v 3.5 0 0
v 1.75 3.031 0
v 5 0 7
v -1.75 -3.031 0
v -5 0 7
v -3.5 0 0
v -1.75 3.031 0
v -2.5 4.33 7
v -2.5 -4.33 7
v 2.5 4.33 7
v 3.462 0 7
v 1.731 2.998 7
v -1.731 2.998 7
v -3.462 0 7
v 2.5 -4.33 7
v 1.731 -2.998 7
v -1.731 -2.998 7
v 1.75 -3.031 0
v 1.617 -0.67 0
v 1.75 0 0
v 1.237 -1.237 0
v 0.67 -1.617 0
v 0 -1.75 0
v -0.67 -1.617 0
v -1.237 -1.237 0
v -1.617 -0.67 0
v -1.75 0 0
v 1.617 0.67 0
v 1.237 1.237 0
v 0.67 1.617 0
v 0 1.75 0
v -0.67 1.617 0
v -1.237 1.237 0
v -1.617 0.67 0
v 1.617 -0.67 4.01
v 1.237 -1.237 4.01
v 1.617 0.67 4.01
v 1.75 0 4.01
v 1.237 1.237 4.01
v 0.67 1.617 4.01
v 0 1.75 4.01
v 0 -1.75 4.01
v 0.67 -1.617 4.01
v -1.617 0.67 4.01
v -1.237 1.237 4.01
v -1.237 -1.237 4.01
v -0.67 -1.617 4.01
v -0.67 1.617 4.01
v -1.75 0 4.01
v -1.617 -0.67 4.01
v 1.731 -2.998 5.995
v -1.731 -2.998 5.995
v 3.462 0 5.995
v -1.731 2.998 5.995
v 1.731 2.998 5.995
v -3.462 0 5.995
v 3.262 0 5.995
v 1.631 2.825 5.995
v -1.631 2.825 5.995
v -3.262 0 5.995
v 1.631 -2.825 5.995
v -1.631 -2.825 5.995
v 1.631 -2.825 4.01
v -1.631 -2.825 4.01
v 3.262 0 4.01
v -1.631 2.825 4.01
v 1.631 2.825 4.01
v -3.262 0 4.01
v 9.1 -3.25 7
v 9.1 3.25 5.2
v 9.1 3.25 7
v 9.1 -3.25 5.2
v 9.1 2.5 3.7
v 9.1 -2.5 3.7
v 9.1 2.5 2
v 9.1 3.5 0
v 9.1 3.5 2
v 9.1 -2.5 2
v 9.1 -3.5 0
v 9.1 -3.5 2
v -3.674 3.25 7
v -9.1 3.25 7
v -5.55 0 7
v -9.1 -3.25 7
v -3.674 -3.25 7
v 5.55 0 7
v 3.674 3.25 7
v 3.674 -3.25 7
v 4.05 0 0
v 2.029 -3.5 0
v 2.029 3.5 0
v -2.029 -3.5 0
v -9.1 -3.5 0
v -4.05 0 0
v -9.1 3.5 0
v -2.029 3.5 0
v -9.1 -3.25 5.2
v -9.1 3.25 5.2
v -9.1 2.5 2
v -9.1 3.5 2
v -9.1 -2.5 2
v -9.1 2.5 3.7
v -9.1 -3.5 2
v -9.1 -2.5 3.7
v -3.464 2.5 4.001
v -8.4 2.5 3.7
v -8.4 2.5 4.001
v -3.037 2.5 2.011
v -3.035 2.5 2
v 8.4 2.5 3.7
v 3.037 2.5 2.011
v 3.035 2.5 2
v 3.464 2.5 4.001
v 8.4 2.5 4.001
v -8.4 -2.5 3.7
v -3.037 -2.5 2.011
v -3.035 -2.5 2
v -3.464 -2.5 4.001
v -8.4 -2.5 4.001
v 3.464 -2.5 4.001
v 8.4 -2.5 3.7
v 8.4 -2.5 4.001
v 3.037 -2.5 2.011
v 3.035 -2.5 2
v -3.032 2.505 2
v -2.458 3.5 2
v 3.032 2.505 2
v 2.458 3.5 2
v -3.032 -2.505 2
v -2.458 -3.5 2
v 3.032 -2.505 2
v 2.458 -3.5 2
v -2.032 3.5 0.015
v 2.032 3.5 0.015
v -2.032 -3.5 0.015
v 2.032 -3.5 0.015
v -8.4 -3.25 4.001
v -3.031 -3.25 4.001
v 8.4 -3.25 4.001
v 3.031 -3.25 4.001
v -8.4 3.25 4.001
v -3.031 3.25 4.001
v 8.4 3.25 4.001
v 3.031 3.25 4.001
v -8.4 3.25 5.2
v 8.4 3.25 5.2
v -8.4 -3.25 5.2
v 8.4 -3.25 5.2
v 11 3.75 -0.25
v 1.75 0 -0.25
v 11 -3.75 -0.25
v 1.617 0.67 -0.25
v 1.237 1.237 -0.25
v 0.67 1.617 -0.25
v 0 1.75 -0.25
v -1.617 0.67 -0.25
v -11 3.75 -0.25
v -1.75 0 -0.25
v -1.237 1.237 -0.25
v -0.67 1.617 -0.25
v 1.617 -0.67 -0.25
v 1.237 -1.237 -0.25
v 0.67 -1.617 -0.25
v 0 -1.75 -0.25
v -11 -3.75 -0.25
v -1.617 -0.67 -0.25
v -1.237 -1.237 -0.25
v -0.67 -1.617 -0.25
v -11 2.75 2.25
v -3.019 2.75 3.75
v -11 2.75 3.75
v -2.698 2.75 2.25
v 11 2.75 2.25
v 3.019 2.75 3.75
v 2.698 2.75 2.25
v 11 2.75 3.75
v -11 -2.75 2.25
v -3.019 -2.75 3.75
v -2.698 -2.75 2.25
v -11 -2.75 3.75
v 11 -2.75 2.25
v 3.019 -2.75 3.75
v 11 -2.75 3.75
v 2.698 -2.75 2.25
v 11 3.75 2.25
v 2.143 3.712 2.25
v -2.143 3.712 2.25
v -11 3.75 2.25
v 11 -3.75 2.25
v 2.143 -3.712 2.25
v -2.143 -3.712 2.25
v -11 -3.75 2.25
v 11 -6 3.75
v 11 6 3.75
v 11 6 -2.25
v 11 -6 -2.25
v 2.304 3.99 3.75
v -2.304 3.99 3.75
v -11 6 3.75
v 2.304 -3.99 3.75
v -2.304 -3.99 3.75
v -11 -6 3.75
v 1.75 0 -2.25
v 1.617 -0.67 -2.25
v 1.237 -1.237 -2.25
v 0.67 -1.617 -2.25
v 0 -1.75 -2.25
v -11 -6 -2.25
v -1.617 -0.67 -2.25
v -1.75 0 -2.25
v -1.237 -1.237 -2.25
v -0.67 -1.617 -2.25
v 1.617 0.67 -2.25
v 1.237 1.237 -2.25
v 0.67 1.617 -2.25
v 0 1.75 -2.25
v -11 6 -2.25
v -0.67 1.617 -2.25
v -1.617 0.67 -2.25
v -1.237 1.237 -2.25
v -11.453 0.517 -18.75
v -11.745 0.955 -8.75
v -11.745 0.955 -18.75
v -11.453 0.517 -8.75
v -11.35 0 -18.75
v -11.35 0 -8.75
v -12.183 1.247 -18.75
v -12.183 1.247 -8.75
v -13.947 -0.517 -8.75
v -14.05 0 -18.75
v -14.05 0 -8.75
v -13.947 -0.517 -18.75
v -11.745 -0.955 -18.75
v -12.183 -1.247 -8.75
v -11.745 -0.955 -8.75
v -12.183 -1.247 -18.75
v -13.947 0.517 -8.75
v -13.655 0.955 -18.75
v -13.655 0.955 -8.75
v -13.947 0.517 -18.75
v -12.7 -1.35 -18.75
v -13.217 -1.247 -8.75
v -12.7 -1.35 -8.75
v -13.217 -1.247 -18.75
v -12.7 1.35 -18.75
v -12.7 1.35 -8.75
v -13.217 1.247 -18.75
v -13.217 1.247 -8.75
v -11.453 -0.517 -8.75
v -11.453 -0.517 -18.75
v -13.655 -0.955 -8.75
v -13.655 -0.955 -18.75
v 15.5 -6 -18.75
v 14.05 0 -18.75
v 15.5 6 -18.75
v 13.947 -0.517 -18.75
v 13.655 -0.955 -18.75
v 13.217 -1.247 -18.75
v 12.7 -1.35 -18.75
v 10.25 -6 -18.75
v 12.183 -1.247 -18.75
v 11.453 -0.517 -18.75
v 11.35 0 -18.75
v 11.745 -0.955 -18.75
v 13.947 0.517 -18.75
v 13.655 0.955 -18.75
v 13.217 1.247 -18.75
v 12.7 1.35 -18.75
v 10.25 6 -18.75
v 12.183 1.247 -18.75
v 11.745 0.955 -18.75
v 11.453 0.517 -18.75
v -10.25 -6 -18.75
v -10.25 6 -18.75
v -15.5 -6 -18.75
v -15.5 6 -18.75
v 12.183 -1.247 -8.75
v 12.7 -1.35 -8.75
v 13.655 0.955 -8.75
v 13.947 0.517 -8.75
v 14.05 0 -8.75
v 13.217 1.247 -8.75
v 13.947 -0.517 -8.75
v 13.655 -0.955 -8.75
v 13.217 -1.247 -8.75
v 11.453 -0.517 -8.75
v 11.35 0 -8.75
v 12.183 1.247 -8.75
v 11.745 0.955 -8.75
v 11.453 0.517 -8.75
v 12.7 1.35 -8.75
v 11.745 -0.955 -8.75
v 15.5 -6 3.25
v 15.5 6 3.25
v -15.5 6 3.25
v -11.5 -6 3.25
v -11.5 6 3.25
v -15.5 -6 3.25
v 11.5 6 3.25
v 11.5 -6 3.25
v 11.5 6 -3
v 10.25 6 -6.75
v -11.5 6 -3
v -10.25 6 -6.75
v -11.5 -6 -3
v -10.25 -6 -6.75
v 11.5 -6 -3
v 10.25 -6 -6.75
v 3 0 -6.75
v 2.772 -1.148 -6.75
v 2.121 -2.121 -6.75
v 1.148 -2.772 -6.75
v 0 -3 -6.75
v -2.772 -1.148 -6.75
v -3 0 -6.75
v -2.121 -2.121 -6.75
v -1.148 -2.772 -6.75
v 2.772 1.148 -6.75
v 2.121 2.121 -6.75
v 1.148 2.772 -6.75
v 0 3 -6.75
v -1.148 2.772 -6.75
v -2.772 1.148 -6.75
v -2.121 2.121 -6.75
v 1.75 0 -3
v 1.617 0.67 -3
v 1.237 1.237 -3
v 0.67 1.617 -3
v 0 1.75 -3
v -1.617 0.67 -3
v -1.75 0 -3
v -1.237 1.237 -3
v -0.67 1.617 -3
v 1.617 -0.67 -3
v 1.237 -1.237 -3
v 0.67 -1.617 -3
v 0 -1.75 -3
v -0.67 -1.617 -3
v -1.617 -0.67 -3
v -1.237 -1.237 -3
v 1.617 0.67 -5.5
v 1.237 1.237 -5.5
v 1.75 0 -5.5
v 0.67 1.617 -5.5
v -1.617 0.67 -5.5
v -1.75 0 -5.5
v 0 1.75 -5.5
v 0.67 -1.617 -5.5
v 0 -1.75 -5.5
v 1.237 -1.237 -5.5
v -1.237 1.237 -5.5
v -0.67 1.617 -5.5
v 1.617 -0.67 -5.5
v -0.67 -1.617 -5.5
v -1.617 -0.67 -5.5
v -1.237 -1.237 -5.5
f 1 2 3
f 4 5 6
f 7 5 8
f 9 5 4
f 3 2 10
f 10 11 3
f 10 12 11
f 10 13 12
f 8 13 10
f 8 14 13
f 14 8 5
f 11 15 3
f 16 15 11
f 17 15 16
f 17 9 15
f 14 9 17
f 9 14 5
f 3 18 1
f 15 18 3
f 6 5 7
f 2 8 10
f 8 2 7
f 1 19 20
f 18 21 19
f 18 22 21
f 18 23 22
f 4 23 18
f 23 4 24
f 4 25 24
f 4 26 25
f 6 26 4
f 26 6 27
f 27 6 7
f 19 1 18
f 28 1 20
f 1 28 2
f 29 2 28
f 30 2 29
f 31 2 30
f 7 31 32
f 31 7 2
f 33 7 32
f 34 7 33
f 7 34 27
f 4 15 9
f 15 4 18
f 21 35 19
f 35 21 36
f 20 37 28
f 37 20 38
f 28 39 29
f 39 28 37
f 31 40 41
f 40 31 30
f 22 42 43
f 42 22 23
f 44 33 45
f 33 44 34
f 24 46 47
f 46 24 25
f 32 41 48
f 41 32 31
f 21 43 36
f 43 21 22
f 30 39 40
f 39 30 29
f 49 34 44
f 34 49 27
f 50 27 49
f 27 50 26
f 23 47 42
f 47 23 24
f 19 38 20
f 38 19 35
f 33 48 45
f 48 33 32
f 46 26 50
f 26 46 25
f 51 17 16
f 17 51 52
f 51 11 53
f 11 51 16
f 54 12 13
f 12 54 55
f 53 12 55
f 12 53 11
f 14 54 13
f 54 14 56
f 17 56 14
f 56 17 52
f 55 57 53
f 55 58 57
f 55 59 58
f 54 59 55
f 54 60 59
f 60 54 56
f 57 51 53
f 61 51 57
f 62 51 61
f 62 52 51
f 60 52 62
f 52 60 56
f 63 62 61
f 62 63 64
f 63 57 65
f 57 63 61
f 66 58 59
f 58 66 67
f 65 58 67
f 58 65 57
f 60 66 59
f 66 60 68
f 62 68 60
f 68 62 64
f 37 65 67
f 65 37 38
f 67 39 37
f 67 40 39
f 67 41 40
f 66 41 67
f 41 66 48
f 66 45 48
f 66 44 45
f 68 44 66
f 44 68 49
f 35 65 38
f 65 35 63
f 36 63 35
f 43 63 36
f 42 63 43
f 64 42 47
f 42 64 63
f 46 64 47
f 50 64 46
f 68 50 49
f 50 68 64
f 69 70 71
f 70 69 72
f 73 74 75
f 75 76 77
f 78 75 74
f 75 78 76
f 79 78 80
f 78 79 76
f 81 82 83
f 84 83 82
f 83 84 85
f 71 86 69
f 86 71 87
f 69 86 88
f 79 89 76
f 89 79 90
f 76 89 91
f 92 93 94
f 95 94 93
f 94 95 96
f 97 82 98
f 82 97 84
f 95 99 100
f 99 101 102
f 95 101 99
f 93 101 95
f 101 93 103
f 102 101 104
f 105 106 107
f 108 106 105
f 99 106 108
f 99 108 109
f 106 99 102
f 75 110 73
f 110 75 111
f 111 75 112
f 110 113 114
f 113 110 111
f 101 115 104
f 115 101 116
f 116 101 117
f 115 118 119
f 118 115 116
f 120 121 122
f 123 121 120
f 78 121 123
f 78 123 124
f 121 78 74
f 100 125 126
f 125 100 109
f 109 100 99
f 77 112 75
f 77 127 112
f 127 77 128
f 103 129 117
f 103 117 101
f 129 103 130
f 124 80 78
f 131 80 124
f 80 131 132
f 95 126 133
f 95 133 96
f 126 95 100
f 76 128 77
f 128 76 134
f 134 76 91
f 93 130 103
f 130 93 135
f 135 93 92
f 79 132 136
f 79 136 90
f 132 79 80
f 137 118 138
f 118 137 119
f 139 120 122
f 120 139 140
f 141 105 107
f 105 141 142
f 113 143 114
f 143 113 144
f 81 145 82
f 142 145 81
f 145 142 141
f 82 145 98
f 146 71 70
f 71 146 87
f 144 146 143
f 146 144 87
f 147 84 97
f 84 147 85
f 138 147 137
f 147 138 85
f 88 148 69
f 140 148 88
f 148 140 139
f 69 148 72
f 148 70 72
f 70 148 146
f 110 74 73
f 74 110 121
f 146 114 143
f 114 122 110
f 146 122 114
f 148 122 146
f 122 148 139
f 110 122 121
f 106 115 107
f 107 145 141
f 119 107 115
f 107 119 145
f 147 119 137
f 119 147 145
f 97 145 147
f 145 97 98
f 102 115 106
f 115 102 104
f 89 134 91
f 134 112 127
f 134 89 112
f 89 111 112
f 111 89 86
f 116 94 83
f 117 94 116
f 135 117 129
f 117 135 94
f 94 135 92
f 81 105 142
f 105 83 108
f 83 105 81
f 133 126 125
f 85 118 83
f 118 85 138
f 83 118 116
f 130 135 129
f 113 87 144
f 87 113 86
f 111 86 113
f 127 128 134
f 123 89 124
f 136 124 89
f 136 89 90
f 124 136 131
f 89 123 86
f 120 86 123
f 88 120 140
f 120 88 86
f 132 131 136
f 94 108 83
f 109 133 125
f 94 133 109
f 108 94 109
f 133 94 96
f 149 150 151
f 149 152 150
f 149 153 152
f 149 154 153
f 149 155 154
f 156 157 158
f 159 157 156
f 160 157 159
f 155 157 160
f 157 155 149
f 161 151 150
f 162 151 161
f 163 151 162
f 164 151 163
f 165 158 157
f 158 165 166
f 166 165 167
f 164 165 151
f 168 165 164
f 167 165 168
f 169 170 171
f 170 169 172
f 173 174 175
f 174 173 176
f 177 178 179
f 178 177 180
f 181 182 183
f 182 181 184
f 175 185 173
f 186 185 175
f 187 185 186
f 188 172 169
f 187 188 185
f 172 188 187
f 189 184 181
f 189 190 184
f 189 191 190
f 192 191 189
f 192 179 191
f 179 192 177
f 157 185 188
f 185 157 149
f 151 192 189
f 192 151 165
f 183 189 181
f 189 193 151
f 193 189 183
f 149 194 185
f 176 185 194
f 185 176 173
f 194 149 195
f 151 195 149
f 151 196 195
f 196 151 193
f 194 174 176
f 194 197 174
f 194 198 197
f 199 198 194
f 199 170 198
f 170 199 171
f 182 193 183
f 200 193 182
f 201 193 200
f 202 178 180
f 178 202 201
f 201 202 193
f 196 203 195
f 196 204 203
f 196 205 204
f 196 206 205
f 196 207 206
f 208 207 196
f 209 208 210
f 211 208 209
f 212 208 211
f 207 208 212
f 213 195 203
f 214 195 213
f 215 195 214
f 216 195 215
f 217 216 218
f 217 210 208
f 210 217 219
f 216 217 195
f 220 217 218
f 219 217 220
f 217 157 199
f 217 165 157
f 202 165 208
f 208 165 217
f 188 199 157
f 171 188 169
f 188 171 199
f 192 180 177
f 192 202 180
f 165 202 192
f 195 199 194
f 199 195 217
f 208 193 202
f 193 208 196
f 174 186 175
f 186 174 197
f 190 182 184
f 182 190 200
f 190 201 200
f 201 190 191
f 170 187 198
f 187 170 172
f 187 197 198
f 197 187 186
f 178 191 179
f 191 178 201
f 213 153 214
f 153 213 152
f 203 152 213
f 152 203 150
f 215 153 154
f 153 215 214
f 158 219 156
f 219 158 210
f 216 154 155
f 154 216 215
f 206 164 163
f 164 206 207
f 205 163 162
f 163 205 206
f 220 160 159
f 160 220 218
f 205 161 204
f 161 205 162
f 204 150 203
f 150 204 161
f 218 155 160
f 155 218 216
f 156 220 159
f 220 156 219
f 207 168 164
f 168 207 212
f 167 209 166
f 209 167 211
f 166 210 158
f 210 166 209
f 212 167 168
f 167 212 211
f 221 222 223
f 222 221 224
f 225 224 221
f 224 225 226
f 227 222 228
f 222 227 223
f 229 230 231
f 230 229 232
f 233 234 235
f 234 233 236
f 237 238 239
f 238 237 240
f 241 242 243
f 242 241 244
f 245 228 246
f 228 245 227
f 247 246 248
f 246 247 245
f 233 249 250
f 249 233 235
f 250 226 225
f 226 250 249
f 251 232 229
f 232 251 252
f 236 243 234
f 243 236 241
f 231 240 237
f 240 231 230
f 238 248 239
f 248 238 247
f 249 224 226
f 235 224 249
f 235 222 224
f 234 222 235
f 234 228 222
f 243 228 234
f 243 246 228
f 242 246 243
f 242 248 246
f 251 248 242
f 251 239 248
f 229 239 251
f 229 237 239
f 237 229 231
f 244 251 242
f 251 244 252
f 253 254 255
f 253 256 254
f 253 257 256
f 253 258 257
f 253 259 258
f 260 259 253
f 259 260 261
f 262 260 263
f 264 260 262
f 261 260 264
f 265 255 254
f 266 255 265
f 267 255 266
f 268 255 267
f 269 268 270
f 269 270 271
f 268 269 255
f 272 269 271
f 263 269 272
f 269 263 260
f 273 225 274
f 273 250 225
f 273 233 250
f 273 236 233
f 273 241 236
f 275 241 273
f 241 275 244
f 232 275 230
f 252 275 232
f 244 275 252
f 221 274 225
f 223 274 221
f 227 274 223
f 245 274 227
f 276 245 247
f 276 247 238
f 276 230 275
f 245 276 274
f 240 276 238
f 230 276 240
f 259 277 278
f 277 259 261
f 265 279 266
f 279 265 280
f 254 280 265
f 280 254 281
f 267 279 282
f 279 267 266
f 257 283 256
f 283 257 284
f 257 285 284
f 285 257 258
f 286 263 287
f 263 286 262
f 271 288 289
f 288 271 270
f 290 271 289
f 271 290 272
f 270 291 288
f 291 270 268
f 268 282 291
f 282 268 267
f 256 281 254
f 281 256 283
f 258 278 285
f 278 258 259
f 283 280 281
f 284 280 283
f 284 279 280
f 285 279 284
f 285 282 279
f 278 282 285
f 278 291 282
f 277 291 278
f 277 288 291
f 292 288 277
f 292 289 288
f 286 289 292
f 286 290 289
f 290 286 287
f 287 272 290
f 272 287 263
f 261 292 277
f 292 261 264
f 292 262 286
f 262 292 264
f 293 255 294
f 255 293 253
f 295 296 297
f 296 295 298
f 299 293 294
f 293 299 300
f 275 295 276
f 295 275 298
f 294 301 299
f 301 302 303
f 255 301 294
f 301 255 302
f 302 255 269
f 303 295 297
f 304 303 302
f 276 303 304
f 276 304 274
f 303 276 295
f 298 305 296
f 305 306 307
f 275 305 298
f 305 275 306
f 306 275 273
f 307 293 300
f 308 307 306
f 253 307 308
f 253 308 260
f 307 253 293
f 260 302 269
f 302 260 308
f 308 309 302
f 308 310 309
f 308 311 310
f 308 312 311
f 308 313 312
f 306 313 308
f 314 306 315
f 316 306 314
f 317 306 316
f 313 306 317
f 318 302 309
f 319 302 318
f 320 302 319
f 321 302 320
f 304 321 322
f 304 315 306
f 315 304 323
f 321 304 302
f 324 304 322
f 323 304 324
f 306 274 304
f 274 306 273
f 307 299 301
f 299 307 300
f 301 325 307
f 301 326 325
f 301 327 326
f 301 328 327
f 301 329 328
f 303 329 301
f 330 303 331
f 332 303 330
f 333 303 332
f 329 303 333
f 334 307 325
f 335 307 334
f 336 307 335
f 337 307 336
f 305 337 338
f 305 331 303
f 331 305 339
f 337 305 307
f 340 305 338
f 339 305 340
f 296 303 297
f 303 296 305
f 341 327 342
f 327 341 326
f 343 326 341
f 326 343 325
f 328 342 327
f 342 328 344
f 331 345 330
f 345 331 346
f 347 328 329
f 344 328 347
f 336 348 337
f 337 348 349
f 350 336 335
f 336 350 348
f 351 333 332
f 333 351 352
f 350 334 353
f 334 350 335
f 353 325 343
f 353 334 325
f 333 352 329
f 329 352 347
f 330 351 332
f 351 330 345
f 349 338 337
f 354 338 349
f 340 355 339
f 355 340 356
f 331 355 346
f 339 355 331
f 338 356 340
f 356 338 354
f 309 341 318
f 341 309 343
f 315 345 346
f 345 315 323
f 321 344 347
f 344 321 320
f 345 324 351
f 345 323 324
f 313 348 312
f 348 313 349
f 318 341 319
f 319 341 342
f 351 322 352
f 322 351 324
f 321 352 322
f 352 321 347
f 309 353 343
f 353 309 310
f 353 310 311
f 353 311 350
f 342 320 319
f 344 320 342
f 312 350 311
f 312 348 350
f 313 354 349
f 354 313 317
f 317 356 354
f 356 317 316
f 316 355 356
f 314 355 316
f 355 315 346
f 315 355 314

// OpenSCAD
// rupa u limu četvrtasta 15.5x15.5 - 16x16 mm
// debljina lima oko 1 mm
// neka konektor prođe 15x10 mm i raširi se na 16.5x10 mm
// neka širina za lim bude 2 mm

conus_d1=7; // small diameter of the conus
conus_d2=10; // large diameter of the conus
conus_h=7; // height of the conus


screw_hole=3.5;
screw_head_d1=6; // closer to top
screw_head_d2=0; // closer to screw
screw_head_h=3;
nut_d=5.65 * (2/sqrt(3));
nut_h=2.5;
nut_depth=1; // sunken depth
nut_d2=nut_d+0.4; // sunken enlarged space

slider_cut_clearance=1.1; // hex cut clearance
slider_y=conus_d1-2;
slider_x=16.0+2*slider_cut_clearance;
slider_z=conus_h;
slider_z2=2; // extra height
slider_y2=slider_y+slider_z2; // slider extra thick
slider_clearance=0.5;
slider_notch_x=0.7; // notch depth
slider_notch_z=1.5; // same as x
slider_notch_zoffset=-0.3;
slider_top_z=3;
slider_top_y=slider_y+slider_notch_z;

carrier_cube=[22,12,6];

connector_bottom_x=20; // 20 or 17
connector_bottom_y=12;
connector_bottom_z=12; // 9 or 12
connector_screw_x=25.4; // screw distance
connector_screw_d=2.7; // 1.8 for plastic 2.2 screw, 2.4 for DB9 spacer, maybe 2.7 for 0.8 mm nozzle
connector_screw_depth=10;
connector_shell_thick=4;
connector_shell_x=31;
connector_shell_clearance=0.5;
connector_shell_clearance_slider_x=1.0;


cover_thick=2; // cover thickness
cover_clearance=0.7;
cover_cable_width=16;
cover_cable_z=15;

cover_inside_cut=[connector_shell_x,carrier_cube[1],carrier_cube[2]]+[0,0,connector_bottom_z+connector_shell_thick+9]+[1,1,1]*cover_clearance;

cover_box=cover_inside_cut+[1,1,0.5]*2*cover_thick;


module kajla_main(add_d=0)
{
        cylinder(d1=conus_d1+add_d, d2=conus_d2+add_d, h=conus_h, $fn=6, center=true);

}

module kajla(add_d=0)
{
  translate([0,0,conus_h/2])
  difference()
  {
    kajla_main(add_d=add_d);
    // hole
    cylinder(d=screw_hole,h=conus_h+0.001, $fn=16, center=true);
    // sunken depth for nut
    translate([0,0,conus_h/2-nut_depth/2])
      cylinder(d=nut_d2,h=nut_depth+0.01, $fn=6,center=true);
    // tight place for nut
    translate([0,0,conus_h/2-nut_depth/2-nut_h/2+0.01])
      cylinder(d=nut_d,h=nut_h, $fn=6,center=true);
  }
}

module slider_main(add_x=0, add=0)
{
  union()
  {
    cube([slider_x+add_x,slider_y+add,slider_z],center=true);
    // add enlarged part bottom
    translate([0,0,-slider_z/2+(slider_z2+add)/2])
      cube([slider_x+add_x,slider_y2+add,(slider_z2+add)],center=true);
    // add enlarged part on top
    // NEED print friendly cut 45 deg
    top_z=slider_top_z-0.001;
    if(1)
    translate([0,0,slider_z/2-(top_z)/2])
      cube([slider_x+add_x,slider_top_y,(top_z)],center=true);

  }
}

module slider()
{
  difference()
  {
    slider_main();
    kajla_main(add_d=slider_cut_clearance);
    // the notches (both sides in for loop)
    for(i=[-1:2:1])
      translate([(-slider_x/2+slider_notch_x/2)*i,0,-slider_z/2+2*slider_z2+slider_notch_z/2+slider_notch_zoffset])
        cube([slider_notch_x,slider_y2+0.01,slider_notch_z],center=true);
  }
}

module base()
{
  translate([0,0,-carrier_cube[2]/2+2*slider_z2-slider_clearance/2])
  difference()
  {
    cube(carrier_cube,center=true);
    // cut for slider
    translate([0,0,carrier_cube[2]/2+slider_z/2-2*slider_z2])
      slider_main(add_x=carrier_cube[0],add=slider_clearance);
    // cut for kajla
    translate([0,0,carrier_cube[2]/2+conus_h/2-2*slider_z2])
      kajla_main(add_d=slider_clearance);
    // cut for screw hole
    cylinder(d=screw_hole,h=carrier_cube[2]+0.01,$fn=16,center=true);
    // cut for screw head
    if(0)
    translate([0,0,-carrier_cube[2]/2+screw_head_h/2])
      cylinder(d1=screw_head_d1,d2=screw_head_d2,h=screw_head_h,$fn=16,center=true);
  }
}

module connector_shell()
{
 translate([0,0,slider_z/2-connector_shell_clearance/2-(connector_bottom_z+connector_shell_thick+carrier_cube[2])/2])
    difference()
    {
      shell_z=connector_bottom_z+connector_shell_thick+carrier_cube[2];
      cube([connector_shell_x,connector_bottom_y,shell_z],center=true);
      // cut for connector bottom
      translate([0,0,-shell_z/2+connector_bottom_z/2])
        cube([connector_bottom_x+connector_shell_clearance,connector_bottom_y,connector_bottom_z],center=true);
      // cut for slider holder
      translate([0,0,shell_z/2-carrier_cube[2]/2])
        cube(carrier_cube+[connector_shell_clearance_slider_x,0,connector_shell_clearance],center=true);
      // cut for screw hole
      cylinder(d=screw_hole,h=shell_z,$fn=16,center=true);
      // cuts for side screw
      for(i=[-1:2:1])
        translate([i*connector_screw_x/2,0,-shell_z/2+connector_screw_depth/2])
          cylinder(d=connector_screw_d,h=connector_screw_depth,$fn=16,center=true);
      // cut for screw head
      if(1)
      translate([0,0,-shell_z/2+connector_bottom_z+screw_head_h/2])
        cylinder(d1=screw_head_d1,d2=screw_head_d2,h=screw_head_h,$fn=16,center=true);
    }
}


module cover()
{
  translate([0,0,-12])
  difference()
  {
    cube(cover_box,center=true);
    // inside cut
    translate([0,0,cover_thick/2+0.01])
      cube(cover_inside_cut,center=true);
    // cable out cut
    translate([0,cover_box[1]/2-cover_thick/2,cover_box[2]/2-cover_cable_z/2])
      cube([cover_cable_width,cover_thick+0.02,cover_cable_z],center=true);
    if(0) // cross-section
    translate([0,50,0])
      cube([100,100,100],center=true);
  }
}


// connector-conus (hold)
if(1)
  kajla();
// connector-slider (hold)
if(1)
translate([0,0,slider_z/2])
  slider();

// conncetor-base
if(1)
  base();

// connector-shell
if(1)
  connector_shell();

if(0)
  cover();
